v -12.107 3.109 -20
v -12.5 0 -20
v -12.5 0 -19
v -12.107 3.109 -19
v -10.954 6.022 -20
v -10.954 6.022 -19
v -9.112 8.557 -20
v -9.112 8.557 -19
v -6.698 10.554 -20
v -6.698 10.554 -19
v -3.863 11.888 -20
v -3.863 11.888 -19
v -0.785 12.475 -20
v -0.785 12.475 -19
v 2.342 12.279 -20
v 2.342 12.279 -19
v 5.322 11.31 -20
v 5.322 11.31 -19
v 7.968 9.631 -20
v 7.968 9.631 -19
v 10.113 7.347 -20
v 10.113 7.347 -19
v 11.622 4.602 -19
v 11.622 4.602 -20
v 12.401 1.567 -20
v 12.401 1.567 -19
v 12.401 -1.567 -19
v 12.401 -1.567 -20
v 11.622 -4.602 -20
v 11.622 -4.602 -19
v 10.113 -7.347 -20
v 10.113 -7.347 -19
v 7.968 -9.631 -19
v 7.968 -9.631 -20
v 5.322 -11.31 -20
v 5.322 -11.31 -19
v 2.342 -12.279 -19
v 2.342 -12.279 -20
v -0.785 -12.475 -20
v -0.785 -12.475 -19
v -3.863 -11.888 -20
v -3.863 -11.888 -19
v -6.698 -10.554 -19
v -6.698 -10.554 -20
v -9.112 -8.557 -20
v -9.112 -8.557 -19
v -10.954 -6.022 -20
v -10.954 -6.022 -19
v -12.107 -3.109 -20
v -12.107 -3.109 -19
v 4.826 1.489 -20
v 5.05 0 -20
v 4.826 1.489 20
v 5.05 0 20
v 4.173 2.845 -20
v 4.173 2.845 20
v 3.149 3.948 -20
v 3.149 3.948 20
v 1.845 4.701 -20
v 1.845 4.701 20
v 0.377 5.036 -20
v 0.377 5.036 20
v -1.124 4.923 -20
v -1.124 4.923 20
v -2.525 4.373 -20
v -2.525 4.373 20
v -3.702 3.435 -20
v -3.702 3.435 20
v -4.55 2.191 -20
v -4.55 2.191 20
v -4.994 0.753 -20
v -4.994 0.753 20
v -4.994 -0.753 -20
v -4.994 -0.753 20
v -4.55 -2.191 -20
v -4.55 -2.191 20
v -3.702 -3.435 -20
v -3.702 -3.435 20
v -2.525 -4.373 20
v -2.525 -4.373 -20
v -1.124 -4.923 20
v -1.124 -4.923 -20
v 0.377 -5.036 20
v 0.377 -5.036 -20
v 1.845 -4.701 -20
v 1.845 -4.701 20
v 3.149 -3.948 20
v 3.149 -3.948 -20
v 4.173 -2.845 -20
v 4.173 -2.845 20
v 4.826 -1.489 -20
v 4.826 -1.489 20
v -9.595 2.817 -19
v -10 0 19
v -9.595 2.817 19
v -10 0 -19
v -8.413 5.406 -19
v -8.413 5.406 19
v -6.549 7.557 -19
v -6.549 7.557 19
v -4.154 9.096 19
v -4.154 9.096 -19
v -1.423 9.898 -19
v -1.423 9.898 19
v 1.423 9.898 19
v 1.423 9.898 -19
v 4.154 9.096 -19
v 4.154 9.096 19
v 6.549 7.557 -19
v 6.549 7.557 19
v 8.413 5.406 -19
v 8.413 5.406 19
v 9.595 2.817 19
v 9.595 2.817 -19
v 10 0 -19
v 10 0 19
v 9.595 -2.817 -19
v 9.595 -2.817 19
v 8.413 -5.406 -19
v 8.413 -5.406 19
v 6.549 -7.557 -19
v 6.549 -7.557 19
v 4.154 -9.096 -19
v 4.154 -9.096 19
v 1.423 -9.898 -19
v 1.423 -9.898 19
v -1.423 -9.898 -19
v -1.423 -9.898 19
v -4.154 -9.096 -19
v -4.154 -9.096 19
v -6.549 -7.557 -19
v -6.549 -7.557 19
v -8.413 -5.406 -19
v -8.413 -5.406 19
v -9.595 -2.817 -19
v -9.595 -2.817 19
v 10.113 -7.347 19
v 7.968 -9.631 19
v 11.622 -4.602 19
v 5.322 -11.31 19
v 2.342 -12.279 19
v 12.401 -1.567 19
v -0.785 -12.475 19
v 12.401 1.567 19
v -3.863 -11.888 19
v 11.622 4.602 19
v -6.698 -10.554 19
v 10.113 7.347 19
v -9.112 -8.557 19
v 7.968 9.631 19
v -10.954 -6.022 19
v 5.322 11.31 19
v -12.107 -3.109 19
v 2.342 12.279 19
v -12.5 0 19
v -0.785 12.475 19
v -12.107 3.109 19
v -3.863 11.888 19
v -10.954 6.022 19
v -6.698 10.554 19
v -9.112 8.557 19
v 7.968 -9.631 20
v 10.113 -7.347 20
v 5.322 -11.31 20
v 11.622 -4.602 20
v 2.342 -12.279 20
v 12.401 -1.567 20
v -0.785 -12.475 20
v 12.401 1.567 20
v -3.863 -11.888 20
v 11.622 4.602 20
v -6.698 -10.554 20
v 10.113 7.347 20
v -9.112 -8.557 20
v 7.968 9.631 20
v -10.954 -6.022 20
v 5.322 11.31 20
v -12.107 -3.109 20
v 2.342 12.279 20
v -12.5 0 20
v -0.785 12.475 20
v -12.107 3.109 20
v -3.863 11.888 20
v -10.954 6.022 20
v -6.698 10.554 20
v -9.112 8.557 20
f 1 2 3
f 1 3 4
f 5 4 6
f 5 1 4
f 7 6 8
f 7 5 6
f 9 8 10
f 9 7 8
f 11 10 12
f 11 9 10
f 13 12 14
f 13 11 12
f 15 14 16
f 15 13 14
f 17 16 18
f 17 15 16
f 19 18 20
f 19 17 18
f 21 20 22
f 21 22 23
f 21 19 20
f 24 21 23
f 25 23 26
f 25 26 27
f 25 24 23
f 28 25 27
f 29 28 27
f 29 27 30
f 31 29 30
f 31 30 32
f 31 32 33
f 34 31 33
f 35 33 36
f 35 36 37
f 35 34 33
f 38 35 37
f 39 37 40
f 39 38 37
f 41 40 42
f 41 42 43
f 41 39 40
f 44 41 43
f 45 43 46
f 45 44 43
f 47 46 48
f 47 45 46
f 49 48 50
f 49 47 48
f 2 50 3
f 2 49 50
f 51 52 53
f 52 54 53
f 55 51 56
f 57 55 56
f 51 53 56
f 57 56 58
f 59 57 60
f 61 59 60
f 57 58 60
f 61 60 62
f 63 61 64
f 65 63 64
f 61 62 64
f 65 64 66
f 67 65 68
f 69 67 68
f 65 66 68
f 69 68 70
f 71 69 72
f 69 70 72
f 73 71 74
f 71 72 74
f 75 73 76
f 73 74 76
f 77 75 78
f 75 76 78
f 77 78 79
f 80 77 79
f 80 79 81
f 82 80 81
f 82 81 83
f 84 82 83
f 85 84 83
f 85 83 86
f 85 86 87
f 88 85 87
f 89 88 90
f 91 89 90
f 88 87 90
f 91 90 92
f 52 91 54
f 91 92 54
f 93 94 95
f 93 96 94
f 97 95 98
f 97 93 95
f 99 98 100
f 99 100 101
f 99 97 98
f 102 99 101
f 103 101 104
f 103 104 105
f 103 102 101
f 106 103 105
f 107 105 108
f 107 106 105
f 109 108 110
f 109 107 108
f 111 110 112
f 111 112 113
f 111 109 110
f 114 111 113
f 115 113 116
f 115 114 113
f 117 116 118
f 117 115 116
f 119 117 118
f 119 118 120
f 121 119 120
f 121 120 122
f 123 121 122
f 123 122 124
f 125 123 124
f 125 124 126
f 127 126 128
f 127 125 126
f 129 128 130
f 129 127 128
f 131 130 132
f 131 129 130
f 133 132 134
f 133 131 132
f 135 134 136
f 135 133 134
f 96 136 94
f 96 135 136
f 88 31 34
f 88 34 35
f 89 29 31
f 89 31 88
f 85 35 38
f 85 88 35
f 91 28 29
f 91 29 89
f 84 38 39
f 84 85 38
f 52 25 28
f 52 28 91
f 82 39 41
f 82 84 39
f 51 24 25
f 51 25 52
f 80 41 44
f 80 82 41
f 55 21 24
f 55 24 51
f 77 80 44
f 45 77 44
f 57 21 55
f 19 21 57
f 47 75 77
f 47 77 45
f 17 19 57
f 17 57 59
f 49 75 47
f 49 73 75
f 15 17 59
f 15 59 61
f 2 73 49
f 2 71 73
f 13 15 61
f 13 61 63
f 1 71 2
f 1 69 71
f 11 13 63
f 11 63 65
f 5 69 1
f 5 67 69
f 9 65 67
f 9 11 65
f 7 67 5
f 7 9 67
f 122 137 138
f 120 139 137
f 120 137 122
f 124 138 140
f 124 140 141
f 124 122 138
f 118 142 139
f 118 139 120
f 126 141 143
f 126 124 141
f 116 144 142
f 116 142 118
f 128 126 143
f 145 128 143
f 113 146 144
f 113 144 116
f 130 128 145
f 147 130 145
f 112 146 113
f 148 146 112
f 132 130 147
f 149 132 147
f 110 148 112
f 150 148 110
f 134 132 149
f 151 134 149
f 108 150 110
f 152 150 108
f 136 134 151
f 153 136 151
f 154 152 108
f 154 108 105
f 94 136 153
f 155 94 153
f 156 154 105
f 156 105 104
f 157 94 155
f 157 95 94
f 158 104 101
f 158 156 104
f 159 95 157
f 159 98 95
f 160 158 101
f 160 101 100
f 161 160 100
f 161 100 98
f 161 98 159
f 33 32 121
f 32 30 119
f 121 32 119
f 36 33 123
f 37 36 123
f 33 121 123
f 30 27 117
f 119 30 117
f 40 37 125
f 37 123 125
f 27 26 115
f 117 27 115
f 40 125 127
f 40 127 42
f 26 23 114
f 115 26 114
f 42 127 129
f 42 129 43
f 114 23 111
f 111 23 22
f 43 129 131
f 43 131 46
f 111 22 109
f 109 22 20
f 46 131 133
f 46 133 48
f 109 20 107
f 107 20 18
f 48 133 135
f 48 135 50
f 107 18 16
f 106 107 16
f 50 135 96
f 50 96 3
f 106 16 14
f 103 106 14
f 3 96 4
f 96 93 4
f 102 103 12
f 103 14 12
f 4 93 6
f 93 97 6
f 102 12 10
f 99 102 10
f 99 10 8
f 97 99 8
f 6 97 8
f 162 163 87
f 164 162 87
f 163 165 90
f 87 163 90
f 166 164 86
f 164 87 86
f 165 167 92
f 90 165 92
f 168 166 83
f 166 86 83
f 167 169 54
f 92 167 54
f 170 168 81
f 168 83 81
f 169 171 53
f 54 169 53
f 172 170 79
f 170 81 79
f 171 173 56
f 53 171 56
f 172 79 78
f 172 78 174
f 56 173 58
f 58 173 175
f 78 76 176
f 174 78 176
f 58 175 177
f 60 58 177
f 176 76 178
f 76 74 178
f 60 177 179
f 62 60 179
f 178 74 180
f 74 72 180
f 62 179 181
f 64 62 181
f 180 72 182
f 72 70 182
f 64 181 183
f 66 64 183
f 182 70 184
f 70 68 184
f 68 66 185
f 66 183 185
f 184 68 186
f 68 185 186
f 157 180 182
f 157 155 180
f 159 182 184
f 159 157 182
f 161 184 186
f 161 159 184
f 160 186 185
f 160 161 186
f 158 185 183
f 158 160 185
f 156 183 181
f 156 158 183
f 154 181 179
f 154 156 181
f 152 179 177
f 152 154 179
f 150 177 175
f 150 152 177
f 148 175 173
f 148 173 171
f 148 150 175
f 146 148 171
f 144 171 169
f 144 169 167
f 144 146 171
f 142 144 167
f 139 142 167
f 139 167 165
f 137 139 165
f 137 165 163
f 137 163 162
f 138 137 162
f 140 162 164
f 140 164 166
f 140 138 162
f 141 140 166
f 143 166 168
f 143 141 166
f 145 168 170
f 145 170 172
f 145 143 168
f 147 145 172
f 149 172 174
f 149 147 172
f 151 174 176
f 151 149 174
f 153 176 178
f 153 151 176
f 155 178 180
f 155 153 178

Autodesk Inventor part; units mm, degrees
ref_plane "YZ Plane" through (0, 0, 0) normal (1, 0, 0) x (0, 1, 0)
ref_plane "XZ Plane" through (0, 0, 0) normal (0, 1, 0) x (-1, 0, 0)
ref_plane "XY Plane" through (0, 0, 0) normal (0, 0, 1) x (1, 0, 0)
sketch "Skizze1" plane through (0, 0, 0) normal (0, 1, 0) x (-1, 0, 0)
  line L0 (0, 20) -> (12.5, 20)
  line L1 (12.5, 20) -> (12.5, 19)
  line L2 (12.5, 19) -> (10, 19)
  line L3 (10, 19) -> (10, -19)
  line L4 (10, -19) -> (12.5, -19)
  line L5 (12.5, -19) -> (12.5, -20)
  line L6 (12.5, -20) -> (0, -20)
  line L7 (0, 20) -> (0, -20)
  line L8 (15, 0) -> (-2.5, 0) projected
  line L9 (0, -28) -> (0, 28) projected
  point P0 (0, 0)
  dimension "d4" = 20
  dimension "d5" = 25
  dimension "d6" = 40
  dimension "d7" = 1
revolve "Umdrehung1" add sketch "Skizze1" angle 360 about axis through (0, 0, 20) along (0, 0, -1)
sketch "Skizze2" plane through (0, 0, 20) normal (0, 0, 1) x (1, 0, 0)
  circle A0 centre (0, 0) radius 12.5 projected
  circle A1 centre (0, 0) radius 5.05
  dimension "d1" = 10.1
extrude "Extrusion1" cut sketch "Skizze2" against normal through all contours A1
properties part number "Seil_Rolle_Antrieb"
